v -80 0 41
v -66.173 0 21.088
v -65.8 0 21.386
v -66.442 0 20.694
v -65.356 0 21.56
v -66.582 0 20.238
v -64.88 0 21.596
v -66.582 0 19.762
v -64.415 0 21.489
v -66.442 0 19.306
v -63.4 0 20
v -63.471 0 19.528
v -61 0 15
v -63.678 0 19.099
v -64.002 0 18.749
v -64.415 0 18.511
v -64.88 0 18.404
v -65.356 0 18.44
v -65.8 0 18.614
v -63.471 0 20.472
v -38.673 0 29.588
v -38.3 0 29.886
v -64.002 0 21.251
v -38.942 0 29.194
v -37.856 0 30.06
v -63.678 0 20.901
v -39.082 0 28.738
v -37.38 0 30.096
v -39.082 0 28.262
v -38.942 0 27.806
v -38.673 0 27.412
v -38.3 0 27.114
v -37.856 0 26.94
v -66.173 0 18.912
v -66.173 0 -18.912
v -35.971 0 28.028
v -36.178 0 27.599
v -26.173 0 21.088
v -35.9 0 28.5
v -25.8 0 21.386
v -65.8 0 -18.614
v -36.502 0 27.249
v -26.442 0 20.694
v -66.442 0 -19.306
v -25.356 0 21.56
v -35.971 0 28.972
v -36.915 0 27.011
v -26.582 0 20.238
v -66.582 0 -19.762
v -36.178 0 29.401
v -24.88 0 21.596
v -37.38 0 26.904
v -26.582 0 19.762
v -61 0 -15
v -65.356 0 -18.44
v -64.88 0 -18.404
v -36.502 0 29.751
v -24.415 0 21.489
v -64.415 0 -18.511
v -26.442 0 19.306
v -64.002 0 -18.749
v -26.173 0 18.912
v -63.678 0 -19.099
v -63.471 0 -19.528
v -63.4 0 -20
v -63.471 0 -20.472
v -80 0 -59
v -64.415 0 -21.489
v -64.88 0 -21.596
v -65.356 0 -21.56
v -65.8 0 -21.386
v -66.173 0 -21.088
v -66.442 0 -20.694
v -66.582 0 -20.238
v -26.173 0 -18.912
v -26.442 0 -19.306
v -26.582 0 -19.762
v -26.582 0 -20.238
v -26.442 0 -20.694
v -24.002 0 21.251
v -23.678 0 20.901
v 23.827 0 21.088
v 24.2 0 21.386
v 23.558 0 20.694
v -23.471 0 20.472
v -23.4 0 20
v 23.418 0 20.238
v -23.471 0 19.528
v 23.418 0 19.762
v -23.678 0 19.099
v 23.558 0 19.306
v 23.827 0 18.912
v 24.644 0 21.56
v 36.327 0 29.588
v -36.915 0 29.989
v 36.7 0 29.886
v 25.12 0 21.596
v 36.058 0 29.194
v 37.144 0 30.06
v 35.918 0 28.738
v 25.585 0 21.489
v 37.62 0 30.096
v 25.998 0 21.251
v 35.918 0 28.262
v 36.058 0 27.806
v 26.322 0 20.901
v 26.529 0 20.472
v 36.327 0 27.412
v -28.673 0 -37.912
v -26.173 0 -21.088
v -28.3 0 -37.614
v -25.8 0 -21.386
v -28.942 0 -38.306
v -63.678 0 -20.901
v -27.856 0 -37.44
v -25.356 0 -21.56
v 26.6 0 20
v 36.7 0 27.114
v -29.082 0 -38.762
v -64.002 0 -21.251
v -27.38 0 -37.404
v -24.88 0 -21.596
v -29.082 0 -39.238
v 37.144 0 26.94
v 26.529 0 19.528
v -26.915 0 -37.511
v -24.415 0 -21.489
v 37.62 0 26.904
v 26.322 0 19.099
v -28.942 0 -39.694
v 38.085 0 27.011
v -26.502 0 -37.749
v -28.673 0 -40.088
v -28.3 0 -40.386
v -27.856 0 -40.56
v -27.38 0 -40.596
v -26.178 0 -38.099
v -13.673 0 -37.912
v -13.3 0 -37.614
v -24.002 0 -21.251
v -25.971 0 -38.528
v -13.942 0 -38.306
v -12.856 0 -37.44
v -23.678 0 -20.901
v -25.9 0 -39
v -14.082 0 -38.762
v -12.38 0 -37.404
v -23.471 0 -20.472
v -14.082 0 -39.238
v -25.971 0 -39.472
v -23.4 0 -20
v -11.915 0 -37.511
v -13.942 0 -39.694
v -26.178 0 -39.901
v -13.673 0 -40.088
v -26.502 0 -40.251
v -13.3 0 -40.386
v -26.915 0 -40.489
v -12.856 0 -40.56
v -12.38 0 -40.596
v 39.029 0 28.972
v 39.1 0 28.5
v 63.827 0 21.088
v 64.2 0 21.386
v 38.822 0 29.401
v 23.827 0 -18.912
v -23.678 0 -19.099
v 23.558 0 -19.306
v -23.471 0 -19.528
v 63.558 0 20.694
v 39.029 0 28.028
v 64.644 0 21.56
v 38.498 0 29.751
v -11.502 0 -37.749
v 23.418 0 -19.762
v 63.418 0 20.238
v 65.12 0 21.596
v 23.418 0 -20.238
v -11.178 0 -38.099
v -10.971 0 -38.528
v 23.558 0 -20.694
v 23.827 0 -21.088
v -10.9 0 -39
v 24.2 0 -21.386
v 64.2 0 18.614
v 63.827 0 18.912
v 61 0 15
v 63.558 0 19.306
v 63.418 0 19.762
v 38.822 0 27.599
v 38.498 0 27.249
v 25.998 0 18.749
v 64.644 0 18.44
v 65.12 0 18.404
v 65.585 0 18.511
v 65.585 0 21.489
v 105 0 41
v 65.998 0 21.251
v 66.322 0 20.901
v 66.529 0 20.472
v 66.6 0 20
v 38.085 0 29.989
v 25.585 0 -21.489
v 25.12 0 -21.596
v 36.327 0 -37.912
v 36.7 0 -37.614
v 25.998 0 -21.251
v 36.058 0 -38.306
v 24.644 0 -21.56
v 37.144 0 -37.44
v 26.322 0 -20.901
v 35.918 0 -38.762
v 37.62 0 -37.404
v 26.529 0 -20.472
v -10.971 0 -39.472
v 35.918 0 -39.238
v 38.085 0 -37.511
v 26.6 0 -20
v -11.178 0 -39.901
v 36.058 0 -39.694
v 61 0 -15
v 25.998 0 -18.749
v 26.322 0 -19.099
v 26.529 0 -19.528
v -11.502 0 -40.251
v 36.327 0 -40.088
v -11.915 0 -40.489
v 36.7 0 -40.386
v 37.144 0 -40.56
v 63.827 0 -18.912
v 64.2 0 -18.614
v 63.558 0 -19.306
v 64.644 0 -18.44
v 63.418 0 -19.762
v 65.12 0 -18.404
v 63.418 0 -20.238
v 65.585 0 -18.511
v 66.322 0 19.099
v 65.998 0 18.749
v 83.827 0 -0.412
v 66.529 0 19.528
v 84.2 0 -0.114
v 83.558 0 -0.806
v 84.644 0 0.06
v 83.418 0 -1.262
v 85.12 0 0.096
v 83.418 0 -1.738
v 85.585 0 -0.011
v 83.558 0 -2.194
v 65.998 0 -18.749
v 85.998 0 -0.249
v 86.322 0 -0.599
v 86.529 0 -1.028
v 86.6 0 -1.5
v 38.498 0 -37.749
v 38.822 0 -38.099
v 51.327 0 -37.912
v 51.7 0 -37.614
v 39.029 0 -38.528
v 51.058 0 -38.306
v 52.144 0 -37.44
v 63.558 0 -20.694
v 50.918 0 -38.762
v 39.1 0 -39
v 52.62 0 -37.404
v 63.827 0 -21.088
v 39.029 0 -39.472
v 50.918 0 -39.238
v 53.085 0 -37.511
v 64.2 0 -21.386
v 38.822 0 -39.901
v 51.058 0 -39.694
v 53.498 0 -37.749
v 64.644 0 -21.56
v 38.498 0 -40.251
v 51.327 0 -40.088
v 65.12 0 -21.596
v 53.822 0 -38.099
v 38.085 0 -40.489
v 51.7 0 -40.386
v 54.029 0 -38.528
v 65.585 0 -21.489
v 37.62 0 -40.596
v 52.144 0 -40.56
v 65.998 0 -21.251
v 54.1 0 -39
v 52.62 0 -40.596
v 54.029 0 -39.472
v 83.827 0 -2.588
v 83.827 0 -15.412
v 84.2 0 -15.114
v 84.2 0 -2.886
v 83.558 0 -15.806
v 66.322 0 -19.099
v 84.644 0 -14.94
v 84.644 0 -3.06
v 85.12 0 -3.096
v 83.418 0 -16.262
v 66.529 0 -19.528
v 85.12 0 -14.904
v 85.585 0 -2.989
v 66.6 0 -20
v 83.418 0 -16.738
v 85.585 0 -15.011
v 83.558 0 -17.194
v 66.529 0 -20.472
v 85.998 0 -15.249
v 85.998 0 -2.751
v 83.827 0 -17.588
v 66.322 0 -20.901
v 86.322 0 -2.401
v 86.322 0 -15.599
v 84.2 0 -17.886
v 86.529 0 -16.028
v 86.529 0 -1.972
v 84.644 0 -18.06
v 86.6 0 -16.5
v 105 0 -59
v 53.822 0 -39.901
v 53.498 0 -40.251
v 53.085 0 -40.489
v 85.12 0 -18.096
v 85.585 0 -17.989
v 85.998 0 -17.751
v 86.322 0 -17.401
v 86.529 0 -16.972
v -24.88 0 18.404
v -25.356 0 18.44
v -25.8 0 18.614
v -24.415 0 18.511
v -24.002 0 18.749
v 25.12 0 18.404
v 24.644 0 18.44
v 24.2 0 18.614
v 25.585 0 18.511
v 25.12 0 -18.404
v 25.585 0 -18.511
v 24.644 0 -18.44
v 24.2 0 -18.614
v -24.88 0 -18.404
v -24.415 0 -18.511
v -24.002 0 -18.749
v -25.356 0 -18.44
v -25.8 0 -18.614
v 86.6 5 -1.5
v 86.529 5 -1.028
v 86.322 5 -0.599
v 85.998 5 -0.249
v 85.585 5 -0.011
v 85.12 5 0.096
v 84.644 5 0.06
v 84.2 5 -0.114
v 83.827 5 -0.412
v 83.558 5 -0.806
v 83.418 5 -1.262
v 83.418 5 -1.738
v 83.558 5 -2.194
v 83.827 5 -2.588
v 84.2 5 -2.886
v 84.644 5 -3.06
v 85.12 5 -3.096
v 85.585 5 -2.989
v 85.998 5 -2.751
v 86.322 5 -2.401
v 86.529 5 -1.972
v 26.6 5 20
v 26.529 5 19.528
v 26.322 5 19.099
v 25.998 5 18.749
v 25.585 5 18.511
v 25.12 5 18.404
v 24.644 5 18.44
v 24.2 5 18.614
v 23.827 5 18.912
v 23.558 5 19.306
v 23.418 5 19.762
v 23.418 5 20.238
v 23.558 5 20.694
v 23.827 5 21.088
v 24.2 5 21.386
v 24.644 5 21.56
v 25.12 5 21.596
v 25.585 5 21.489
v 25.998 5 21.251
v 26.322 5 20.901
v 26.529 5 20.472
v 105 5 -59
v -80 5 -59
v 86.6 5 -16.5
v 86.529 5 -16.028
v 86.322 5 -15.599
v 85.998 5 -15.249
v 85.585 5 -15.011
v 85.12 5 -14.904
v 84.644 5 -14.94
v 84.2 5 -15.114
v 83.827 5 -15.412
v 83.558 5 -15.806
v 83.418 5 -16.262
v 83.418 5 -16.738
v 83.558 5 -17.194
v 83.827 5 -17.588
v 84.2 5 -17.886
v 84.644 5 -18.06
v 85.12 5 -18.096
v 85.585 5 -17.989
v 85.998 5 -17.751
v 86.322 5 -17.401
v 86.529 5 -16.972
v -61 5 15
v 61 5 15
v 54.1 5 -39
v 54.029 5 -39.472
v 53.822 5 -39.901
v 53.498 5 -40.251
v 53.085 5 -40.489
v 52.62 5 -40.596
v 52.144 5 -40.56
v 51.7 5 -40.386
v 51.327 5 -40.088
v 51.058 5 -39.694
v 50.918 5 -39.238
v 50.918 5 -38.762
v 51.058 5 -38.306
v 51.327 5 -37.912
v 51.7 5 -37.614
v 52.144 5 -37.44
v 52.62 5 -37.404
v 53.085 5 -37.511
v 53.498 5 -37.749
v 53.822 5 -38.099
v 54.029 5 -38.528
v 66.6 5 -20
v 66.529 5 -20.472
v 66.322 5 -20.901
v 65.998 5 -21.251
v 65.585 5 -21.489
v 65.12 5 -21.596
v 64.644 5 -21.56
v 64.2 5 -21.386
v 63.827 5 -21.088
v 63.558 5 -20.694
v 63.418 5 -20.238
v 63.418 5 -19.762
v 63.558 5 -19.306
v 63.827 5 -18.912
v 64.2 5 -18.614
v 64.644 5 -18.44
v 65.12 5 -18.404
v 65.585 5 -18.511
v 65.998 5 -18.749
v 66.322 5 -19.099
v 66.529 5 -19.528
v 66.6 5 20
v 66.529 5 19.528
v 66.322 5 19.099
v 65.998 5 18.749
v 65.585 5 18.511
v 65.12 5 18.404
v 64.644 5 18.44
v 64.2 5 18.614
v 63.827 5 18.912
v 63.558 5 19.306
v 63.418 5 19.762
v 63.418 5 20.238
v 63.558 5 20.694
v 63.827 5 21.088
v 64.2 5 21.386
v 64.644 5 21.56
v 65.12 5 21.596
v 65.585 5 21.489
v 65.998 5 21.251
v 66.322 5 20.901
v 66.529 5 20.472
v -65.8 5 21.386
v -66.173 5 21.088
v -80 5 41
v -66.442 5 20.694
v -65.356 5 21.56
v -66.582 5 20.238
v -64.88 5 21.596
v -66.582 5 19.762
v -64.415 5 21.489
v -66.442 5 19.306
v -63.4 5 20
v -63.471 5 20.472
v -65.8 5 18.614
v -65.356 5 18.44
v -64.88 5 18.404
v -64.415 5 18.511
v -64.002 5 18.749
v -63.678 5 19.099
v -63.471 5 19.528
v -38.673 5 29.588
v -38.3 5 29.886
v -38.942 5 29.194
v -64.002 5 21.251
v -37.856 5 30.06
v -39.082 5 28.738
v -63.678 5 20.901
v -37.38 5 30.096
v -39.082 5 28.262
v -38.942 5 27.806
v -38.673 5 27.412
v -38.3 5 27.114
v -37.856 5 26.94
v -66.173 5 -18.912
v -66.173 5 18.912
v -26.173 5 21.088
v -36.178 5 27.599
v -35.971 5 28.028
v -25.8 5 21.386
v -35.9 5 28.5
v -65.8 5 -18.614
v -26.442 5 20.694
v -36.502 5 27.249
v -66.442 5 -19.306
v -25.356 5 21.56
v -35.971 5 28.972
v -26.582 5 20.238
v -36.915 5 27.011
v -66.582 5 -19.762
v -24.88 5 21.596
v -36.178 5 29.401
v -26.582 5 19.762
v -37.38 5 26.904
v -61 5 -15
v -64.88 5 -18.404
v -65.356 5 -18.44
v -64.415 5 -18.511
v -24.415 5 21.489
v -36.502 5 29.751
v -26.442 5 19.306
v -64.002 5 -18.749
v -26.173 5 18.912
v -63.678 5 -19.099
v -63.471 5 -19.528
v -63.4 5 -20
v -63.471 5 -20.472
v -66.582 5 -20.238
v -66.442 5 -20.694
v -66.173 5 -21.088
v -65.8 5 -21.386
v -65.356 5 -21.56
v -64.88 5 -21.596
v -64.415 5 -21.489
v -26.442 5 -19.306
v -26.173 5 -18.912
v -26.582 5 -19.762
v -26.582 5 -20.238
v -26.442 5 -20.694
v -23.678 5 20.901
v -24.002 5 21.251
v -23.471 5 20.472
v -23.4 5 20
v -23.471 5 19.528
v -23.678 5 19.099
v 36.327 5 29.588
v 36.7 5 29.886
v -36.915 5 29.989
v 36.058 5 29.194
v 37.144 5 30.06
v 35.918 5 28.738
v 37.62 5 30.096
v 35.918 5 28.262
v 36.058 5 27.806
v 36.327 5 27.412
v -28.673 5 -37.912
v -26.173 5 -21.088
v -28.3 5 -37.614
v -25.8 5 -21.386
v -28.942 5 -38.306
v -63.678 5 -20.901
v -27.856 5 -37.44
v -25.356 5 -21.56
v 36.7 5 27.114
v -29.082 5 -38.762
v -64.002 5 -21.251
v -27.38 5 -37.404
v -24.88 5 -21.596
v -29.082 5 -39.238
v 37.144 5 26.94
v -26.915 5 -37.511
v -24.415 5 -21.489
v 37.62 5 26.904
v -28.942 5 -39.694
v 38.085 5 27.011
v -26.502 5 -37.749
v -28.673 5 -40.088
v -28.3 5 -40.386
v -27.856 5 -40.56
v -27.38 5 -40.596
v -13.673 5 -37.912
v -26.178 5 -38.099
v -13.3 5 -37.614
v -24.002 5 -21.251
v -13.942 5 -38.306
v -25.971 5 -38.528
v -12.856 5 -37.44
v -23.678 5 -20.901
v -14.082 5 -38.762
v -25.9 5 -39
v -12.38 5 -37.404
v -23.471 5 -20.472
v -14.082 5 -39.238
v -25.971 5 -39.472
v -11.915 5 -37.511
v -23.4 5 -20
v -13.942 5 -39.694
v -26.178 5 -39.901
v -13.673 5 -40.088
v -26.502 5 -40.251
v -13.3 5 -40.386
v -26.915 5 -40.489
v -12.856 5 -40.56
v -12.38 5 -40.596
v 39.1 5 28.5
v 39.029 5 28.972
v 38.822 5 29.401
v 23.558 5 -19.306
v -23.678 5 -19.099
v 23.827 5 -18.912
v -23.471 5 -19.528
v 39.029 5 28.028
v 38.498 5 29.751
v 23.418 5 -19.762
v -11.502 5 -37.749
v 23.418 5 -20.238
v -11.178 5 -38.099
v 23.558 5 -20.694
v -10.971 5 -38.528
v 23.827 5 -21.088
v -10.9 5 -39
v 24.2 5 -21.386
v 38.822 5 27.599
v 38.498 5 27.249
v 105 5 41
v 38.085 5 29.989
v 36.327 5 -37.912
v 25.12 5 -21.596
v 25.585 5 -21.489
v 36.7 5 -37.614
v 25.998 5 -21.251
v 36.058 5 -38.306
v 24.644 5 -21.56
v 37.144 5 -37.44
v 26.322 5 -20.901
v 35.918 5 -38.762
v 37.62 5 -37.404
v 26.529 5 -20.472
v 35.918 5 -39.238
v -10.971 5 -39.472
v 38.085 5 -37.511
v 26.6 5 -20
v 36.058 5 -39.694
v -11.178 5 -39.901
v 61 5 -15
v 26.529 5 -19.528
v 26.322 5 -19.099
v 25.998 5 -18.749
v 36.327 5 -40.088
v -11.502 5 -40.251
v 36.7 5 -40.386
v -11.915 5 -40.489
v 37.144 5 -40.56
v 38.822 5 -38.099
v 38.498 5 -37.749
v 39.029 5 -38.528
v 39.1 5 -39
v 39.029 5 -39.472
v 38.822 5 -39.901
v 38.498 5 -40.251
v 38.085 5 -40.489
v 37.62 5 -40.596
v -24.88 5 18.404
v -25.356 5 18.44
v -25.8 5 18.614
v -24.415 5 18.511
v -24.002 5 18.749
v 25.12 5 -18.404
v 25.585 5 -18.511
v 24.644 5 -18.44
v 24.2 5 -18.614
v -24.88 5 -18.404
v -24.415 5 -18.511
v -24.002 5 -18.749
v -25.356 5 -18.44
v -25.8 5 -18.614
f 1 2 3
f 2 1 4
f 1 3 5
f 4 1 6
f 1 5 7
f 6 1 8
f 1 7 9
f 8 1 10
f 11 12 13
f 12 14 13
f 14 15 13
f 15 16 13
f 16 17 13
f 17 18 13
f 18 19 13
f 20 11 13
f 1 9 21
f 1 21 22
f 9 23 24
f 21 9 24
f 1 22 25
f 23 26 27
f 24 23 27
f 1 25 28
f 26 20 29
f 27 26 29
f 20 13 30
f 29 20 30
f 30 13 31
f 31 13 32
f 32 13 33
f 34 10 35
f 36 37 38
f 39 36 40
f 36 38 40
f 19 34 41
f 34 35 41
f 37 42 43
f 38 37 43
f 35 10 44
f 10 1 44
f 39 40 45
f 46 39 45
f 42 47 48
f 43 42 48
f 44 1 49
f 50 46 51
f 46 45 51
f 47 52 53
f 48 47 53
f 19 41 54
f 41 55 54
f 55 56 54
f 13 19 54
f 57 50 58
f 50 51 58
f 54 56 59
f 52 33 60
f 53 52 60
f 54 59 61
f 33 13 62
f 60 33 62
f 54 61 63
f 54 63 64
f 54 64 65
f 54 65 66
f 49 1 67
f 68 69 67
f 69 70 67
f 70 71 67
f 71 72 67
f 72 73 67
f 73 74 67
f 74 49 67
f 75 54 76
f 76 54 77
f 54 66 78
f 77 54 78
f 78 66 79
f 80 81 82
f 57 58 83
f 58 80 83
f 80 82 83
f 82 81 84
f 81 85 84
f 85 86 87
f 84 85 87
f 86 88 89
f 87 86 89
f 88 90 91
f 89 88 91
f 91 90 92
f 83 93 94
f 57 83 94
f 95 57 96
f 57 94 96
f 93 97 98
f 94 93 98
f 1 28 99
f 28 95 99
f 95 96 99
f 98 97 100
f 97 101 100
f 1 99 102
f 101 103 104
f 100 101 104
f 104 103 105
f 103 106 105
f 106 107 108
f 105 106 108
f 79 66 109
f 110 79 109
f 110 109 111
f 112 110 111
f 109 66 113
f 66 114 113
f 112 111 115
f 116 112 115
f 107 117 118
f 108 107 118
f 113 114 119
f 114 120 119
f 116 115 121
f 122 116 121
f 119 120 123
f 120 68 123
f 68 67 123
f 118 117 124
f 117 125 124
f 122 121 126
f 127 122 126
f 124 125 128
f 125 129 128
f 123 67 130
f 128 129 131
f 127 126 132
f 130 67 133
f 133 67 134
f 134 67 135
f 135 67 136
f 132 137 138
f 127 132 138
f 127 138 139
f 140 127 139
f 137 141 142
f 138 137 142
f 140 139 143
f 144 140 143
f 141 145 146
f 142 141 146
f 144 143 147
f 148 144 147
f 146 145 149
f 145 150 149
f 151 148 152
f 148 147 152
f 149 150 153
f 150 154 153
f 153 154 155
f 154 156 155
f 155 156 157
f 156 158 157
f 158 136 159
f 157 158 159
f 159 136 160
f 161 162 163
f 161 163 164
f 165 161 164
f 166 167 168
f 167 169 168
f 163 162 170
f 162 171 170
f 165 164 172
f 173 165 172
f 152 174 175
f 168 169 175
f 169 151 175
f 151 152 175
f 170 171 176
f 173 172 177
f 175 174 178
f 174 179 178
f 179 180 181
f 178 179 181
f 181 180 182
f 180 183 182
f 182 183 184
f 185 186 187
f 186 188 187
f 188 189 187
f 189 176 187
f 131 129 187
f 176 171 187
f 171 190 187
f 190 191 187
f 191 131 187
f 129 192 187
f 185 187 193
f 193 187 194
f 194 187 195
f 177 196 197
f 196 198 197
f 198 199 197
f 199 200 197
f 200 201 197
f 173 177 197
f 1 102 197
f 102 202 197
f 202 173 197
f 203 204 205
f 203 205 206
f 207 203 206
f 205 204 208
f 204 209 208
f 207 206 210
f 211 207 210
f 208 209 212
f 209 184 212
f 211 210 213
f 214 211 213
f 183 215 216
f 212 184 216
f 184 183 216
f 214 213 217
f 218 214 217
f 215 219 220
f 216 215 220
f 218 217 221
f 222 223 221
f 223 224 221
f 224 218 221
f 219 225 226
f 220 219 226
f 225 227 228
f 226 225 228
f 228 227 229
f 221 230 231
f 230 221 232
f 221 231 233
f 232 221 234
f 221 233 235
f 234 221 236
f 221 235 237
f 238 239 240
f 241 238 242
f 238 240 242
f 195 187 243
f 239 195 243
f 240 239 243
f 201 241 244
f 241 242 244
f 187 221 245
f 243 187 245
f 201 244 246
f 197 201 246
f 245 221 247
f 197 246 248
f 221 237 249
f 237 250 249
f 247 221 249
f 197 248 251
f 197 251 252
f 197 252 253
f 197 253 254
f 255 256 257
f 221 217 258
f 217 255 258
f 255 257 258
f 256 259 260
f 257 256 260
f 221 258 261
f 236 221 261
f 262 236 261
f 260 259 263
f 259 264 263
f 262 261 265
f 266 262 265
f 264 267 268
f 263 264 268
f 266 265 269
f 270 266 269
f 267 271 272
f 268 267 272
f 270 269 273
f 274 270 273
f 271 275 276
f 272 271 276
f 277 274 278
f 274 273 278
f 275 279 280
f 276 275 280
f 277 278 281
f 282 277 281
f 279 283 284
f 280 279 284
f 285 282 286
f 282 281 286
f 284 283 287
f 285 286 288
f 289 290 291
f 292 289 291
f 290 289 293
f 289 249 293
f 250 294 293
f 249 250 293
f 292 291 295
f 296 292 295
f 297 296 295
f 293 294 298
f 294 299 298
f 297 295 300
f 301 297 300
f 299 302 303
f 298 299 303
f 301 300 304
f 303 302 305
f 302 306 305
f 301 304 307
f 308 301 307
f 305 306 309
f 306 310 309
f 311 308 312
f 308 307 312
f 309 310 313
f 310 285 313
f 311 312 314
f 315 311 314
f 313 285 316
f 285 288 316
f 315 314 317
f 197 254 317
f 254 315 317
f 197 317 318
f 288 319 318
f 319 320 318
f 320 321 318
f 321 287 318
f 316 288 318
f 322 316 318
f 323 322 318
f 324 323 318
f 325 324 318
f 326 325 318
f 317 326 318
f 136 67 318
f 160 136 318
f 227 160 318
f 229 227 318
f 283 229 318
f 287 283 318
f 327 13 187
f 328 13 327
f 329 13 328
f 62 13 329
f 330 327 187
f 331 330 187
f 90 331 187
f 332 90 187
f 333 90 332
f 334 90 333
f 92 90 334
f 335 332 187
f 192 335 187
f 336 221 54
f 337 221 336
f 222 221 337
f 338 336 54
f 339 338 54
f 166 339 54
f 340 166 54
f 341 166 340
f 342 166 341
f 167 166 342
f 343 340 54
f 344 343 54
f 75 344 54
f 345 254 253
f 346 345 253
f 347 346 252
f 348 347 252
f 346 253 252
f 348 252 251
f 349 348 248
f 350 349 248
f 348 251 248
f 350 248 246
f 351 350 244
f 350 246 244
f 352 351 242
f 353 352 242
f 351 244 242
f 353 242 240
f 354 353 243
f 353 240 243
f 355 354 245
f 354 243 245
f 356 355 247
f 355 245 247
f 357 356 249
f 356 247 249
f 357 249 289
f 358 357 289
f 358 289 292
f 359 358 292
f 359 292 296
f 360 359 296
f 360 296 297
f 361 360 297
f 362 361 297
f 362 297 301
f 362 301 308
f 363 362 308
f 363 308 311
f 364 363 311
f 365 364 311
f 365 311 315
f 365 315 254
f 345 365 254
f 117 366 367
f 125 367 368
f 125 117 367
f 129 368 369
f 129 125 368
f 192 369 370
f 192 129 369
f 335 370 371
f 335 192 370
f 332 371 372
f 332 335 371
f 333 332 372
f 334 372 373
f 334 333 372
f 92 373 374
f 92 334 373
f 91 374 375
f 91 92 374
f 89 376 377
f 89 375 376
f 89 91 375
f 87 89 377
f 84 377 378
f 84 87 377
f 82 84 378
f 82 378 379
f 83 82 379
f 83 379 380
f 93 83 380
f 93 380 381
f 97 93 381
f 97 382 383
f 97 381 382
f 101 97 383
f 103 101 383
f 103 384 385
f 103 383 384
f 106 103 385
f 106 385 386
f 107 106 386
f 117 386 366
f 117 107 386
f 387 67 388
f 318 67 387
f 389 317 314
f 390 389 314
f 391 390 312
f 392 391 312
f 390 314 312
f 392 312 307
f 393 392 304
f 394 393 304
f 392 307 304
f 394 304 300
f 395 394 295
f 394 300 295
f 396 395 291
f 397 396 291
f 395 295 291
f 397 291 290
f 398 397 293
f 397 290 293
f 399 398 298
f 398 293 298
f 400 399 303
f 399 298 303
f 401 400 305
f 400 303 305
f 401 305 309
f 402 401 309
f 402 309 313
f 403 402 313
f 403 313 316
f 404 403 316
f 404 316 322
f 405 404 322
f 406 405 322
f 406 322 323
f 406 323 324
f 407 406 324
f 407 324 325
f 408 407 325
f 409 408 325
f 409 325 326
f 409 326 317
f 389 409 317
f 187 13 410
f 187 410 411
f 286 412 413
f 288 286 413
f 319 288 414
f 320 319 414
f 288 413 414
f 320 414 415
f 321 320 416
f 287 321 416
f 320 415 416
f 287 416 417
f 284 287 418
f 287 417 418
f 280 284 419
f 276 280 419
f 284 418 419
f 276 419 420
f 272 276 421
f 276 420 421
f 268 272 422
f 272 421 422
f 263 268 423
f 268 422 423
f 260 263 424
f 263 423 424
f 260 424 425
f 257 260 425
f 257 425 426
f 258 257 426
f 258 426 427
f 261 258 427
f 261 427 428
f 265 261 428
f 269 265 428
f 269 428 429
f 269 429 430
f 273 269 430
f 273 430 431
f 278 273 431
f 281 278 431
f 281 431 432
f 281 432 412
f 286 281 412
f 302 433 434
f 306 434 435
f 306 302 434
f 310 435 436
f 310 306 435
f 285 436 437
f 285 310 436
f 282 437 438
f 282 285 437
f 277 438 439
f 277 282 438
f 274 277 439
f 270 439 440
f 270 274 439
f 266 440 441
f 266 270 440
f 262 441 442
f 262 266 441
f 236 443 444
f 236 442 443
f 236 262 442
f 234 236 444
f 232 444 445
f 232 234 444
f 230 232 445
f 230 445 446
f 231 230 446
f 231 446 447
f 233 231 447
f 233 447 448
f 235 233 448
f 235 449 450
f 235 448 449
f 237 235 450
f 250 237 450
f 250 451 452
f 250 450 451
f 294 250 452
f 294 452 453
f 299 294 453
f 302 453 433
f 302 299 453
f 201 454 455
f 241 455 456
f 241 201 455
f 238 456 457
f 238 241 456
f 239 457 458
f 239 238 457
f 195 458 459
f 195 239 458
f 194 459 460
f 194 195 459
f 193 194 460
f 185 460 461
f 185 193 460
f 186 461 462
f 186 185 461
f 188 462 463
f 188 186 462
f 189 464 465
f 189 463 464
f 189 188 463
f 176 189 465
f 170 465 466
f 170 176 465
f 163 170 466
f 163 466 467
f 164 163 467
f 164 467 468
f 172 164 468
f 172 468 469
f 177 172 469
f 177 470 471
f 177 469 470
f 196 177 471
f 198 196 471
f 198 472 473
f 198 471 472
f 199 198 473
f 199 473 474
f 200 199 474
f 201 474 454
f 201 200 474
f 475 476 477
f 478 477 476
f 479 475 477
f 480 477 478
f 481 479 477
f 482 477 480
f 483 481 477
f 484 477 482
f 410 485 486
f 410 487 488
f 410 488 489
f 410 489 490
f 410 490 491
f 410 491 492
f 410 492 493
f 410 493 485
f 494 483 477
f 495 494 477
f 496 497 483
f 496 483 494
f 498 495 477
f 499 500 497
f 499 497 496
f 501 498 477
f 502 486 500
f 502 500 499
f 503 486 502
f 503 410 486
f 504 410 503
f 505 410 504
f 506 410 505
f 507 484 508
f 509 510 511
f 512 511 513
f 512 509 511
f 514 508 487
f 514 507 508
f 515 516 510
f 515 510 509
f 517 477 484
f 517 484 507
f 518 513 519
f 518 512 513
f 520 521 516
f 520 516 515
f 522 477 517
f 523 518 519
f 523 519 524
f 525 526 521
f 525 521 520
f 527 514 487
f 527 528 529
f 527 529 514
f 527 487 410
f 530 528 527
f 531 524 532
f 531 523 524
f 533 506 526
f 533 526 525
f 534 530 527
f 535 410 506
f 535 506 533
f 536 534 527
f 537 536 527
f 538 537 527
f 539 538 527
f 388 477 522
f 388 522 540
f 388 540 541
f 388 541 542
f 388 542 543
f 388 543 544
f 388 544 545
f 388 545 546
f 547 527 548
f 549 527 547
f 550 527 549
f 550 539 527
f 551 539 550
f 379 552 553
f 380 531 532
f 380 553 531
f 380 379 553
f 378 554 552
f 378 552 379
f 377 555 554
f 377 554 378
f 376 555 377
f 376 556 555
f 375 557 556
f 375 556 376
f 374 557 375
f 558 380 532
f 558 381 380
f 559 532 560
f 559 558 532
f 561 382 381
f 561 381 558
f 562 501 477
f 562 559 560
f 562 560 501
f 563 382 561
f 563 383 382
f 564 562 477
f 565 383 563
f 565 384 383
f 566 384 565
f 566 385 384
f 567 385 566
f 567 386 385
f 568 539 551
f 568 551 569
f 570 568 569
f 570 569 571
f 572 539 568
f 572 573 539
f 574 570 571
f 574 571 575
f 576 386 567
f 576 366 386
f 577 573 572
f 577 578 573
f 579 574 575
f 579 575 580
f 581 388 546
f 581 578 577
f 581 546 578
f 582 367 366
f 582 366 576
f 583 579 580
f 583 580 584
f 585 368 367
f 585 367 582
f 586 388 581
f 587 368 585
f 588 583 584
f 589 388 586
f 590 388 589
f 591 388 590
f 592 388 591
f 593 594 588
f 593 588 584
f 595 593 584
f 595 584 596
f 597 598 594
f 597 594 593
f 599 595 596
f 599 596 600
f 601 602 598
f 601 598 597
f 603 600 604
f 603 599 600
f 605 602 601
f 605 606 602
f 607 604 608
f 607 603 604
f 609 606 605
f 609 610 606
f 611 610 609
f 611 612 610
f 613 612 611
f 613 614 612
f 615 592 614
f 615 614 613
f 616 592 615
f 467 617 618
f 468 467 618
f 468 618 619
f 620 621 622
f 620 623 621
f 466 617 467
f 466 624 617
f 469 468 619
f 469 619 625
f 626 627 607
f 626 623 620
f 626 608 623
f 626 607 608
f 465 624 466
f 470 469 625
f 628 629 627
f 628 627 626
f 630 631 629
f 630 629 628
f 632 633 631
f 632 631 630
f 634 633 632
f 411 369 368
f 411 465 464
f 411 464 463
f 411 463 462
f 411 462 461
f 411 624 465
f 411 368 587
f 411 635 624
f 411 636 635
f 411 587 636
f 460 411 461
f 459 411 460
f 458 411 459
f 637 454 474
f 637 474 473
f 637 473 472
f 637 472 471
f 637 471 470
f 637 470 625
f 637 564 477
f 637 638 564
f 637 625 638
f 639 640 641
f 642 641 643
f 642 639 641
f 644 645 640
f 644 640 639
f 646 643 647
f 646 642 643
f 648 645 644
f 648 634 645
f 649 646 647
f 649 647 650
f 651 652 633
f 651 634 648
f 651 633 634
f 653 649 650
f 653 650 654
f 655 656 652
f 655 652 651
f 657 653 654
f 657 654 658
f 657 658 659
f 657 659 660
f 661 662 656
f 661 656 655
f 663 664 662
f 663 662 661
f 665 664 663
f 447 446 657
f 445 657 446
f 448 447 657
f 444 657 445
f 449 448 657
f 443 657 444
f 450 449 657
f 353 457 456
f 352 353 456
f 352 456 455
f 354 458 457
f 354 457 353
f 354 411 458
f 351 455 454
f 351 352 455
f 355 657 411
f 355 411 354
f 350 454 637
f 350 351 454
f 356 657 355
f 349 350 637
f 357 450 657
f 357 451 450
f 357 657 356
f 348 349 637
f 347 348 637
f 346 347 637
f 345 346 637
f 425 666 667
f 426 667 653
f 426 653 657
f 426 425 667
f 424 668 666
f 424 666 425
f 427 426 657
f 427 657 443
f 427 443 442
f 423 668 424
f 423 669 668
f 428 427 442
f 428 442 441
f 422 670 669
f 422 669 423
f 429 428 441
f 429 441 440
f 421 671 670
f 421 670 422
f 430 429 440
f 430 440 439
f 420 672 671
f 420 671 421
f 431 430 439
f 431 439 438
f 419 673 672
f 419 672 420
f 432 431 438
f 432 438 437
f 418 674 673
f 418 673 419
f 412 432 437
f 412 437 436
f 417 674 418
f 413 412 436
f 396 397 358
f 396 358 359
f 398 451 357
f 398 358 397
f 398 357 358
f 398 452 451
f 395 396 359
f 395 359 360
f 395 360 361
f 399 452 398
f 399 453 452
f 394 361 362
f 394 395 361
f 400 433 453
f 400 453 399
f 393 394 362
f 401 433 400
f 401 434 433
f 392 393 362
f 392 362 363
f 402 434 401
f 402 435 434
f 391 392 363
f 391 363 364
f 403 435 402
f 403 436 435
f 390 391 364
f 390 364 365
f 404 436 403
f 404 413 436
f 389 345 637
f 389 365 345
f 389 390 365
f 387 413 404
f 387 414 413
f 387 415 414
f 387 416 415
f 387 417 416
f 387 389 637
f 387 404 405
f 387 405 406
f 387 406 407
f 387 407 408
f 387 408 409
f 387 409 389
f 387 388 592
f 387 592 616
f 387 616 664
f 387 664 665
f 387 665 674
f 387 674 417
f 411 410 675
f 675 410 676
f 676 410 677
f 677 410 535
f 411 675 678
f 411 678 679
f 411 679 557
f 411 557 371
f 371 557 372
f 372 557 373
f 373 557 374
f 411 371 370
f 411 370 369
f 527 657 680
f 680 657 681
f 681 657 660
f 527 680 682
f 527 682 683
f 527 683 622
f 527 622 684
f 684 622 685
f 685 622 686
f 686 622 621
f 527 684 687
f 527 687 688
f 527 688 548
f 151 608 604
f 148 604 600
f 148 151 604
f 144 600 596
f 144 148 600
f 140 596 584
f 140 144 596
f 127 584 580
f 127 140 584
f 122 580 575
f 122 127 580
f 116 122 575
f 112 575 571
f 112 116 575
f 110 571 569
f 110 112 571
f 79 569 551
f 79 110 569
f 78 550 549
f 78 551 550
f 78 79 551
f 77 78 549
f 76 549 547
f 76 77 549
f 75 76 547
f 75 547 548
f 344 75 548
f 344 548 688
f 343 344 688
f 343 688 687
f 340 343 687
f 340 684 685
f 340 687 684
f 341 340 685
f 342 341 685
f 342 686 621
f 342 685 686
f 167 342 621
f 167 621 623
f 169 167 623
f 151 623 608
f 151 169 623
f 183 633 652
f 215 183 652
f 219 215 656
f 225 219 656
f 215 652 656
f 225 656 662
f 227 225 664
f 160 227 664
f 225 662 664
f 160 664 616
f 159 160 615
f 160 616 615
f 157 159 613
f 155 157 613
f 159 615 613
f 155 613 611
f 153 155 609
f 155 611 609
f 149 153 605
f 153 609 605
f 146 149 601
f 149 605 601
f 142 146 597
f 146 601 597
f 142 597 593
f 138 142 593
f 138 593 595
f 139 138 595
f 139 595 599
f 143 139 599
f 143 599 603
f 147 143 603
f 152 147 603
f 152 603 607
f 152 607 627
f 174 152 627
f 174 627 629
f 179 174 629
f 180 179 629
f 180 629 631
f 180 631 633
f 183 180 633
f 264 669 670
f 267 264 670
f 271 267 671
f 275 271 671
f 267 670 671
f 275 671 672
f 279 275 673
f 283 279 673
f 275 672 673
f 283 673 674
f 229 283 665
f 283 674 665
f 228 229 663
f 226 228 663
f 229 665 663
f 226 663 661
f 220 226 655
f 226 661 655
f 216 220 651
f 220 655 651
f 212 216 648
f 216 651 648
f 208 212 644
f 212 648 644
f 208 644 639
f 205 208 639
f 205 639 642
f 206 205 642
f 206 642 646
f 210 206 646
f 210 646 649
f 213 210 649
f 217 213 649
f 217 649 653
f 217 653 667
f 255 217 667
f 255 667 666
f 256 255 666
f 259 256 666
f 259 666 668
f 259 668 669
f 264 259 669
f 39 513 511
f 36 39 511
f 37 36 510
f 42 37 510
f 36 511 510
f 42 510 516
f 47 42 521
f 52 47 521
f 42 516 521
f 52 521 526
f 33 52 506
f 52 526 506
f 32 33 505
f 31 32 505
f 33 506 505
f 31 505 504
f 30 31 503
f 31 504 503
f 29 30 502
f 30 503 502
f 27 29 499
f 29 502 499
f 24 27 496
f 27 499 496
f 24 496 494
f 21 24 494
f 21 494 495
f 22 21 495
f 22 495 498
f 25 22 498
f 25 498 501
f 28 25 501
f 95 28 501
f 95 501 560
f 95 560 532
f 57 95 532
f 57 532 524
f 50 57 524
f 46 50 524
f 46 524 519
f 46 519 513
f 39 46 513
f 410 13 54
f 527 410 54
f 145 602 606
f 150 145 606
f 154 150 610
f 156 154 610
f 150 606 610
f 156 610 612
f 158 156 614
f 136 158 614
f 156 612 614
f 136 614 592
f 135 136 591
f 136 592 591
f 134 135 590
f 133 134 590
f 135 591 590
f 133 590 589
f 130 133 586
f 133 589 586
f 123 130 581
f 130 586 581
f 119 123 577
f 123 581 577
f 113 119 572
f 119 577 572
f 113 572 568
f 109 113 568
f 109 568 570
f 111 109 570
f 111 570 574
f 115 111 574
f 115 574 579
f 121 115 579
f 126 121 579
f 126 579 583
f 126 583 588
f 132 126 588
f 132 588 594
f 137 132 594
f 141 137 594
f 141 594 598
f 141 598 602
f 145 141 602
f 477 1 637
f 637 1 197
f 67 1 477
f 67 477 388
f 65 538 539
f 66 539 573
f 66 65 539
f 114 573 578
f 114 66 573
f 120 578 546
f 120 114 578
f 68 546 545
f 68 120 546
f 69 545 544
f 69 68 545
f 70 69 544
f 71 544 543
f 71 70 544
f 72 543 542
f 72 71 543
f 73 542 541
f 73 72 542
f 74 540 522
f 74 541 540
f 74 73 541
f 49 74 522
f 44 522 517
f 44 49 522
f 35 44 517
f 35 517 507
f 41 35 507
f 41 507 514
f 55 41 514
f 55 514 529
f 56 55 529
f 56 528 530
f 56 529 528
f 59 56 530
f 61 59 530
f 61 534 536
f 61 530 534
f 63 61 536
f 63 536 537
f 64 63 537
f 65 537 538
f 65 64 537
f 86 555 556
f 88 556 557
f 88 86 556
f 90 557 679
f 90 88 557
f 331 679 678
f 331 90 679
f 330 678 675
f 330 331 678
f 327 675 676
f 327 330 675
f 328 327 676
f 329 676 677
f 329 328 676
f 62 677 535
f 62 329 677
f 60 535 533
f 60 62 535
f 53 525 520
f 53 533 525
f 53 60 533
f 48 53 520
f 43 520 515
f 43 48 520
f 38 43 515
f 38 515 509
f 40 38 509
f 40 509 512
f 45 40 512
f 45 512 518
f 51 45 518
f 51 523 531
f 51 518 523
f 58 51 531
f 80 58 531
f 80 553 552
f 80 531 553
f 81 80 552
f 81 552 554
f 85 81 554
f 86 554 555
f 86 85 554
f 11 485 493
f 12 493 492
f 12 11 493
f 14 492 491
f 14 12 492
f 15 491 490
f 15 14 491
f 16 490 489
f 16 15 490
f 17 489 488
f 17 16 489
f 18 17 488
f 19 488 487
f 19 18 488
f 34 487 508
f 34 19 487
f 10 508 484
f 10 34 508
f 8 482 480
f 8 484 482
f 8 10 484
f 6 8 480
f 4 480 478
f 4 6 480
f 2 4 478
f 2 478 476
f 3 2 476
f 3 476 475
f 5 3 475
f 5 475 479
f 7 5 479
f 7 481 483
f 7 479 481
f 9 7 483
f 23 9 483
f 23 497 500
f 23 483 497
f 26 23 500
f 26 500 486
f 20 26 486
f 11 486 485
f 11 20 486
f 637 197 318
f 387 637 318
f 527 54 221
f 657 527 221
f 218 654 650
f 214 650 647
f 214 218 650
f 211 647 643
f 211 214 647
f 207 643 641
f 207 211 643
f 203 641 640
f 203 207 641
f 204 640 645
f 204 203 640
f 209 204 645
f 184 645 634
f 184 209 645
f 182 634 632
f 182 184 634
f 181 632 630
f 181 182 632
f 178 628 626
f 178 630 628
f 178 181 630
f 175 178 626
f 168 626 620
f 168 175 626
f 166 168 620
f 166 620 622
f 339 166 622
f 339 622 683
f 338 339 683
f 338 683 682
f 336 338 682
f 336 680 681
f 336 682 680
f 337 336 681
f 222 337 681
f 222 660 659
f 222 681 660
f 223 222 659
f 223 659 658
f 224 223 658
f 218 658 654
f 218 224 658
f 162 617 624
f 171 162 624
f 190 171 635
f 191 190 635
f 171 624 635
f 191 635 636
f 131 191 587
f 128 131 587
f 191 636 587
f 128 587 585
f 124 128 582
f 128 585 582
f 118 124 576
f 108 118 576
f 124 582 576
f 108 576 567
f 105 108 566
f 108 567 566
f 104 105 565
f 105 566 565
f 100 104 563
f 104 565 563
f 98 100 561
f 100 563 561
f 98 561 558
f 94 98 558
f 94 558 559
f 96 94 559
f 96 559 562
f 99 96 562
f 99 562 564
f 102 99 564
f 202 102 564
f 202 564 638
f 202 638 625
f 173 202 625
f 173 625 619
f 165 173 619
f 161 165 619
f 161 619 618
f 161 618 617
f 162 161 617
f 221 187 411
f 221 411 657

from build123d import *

# Parameters (mm, degrees)
SKETCH1_W           = 185
SKETCH1_H           = 100
SKETCH1_W_2         = 122
SKETCH1_H_2         = 30
BOSS_EXTRUDE1_DEPTH = 5
CUT_EXTRUDE2_REACH  = 7
SKETCH2_R           = 1.6
CUT_EXTRUDE3_REACH  = 7
SKETCH3_R           = 1.6
CUT_EXTRUDE4_REACH  = 7
SKETCH4_R           = 1.6
CUT_EXTRUDE5_REACH  = 7
SKETCH5_R           = 1.6


with BuildPart() as part:
    # Sketch1 → Boss-Extrude1 (new body)
    with BuildSketch(Plane(origin=(0, 0, 0), x_dir=(1, 0, 0), z_dir=(0, 1, 0))):
        with Locations((12.5, 9)):
            Rectangle(SKETCH1_W, SKETCH1_H)
        Rectangle(SKETCH1_W_2, SKETCH1_H_2, mode=Mode.SUBTRACT)
    extrude(amount=BOSS_EXTRUDE1_DEPTH)

    # Sketch2 → Cut-Extrude2 (cut, up to next)
    with BuildSketch(Plane(origin=(0, 0, 0), x_dir=(1, 0, 0), z_dir=(0, 1, 0)), mode=Mode.PRIVATE) as cut_extrude2_sk1:
        with Locations((-25, 20)):
            Circle(SKETCH2_R)
    cut_extrude2_tool1 = extrude(cut_extrude2_sk1.sketch, amount=CUT_EXTRUDE2_REACH, mode=Mode.PRIVATE) & part.part
    add(cut_extrude2_tool1.solids().sort_by_distance((-25, 0, -20))[0], mode=Mode.SUBTRACT)
    # Sketch2 → Cut-Extrude2 (cut, up to next)
    with BuildSketch(Plane(origin=(0, 0, 0), x_dir=(1, 0, 0), z_dir=(0, 1, 0)), mode=Mode.PRIVATE) as cut_extrude2_sk2:
        with Locations((25, 20)):
            Circle(SKETCH2_R)
    cut_extrude2_tool2 = extrude(cut_extrude2_sk2.sketch, amount=CUT_EXTRUDE2_REACH, mode=Mode.PRIVATE) & part.part
    add(cut_extrude2_tool2.solids().sort_by_distance((25, 0, -20))[0], mode=Mode.SUBTRACT)
    # Sketch2 → Cut-Extrude2 (cut, up to next)
    with BuildSketch(Plane(origin=(0, 0, 0), x_dir=(1, 0, 0), z_dir=(0, 1, 0)), mode=Mode.PRIVATE) as cut_extrude2_sk3:
        with Locations((25, -20)):
            Circle(SKETCH2_R)
    cut_extrude2_tool3 = extrude(cut_extrude2_sk3.sketch, amount=CUT_EXTRUDE2_REACH, mode=Mode.PRIVATE) & part.part
    add(cut_extrude2_tool3.solids().sort_by_distance((25, 0, 20))[0], mode=Mode.SUBTRACT)
    # Sketch2 → Cut-Extrude2 (cut, up to next)
    with BuildSketch(Plane(origin=(0, 0, 0), x_dir=(1, 0, 0), z_dir=(0, 1, 0)), mode=Mode.PRIVATE) as cut_extrude2_sk4:
        with Locations((-25, -20)):
            Circle(SKETCH2_R)
    cut_extrude2_tool4 = extrude(cut_extrude2_sk4.sketch, amount=CUT_EXTRUDE2_REACH, mode=Mode.PRIVATE) & part.part
    add(cut_extrude2_tool4.solids().sort_by_distance((-25, 0, 20))[0], mode=Mode.SUBTRACT)
    # Sketch2 → Cut-Extrude2 (cut, up to next)
    with BuildSketch(Plane(origin=(0, 0, 0), x_dir=(1, 0, 0), z_dir=(0, 1, 0)), mode=Mode.PRIVATE) as cut_extrude2_sk5:
        with Locations((-65, 20)):
            Circle(SKETCH2_R)
    cut_extrude2_tool5 = extrude(cut_extrude2_sk5.sketch, amount=CUT_EXTRUDE2_REACH, mode=Mode.PRIVATE) & part.part
    add(cut_extrude2_tool5.solids().sort_by_distance((-65, 0, -20))[0], mode=Mode.SUBTRACT)
    # Sketch2 → Cut-Extrude2 (cut, up to next)
    with BuildSketch(Plane(origin=(0, 0, 0), x_dir=(1, 0, 0), z_dir=(0, 1, 0)), mode=Mode.PRIVATE) as cut_extrude2_sk6:
        with Locations((65, 20)):
            Circle(SKETCH2_R)
    cut_extrude2_tool6 = extrude(cut_extrude2_sk6.sketch, amount=CUT_EXTRUDE2_REACH, mode=Mode.PRIVATE) & part.part
    add(cut_extrude2_tool6.solids().sort_by_distance((65, 0, -20))[0], mode=Mode.SUBTRACT)
    # Sketch2 → Cut-Extrude2 (cut, up to next)
    with BuildSketch(Plane(origin=(0, 0, 0), x_dir=(1, 0, 0), z_dir=(0, 1, 0)), mode=Mode.PRIVATE) as cut_extrude2_sk7:
        with Locations((65, -20)):
            Circle(SKETCH2_R)
    cut_extrude2_tool7 = extrude(cut_extrude2_sk7.sketch, amount=CUT_EXTRUDE2_REACH, mode=Mode.PRIVATE) & part.part
    add(cut_extrude2_tool7.solids().sort_by_distance((65, 0, 20))[0], mode=Mode.SUBTRACT)
    # Sketch2 → Cut-Extrude2 (cut, up to next)
    with BuildSketch(Plane(origin=(0, 0, 0), x_dir=(1, 0, 0), z_dir=(0, 1, 0)), mode=Mode.PRIVATE) as cut_extrude2_sk8:
        with Locations((-65, -20)):
            Circle(SKETCH2_R)
    cut_extrude2_tool8 = extrude(cut_extrude2_sk8.sketch, amount=CUT_EXTRUDE2_REACH, mode=Mode.PRIVATE) & part.part
    add(cut_extrude2_tool8.solids().sort_by_distance((-65, 0, 20))[0], mode=Mode.SUBTRACT)

    # Sketch3 → Cut-Extrude3 (cut, up to next)
    with BuildSketch(Plane(origin=(0, 5, 0), x_dir=(1, 0, 0), z_dir=(0, 1, 0)), mode=Mode.PRIVATE) as cut_extrude3_sk1:
        with Locations((-27.5, 39)):
            Circle(SKETCH3_R)
    cut_extrude3_tool1 = extrude(cut_extrude3_sk1.sketch, amount=-CUT_EXTRUDE3_REACH, mode=Mode.PRIVATE) & part.part
    add(cut_extrude3_tool1.solids().sort_by_distance((-27.5, 5, -39))[0], mode=Mode.SUBTRACT)
    # Sketch3 → Cut-Extrude3 (cut, up to next)
    with BuildSketch(Plane(origin=(0, 5, 0), x_dir=(1, 0, 0), z_dir=(0, 1, 0)), mode=Mode.PRIVATE) as cut_extrude3_sk2:
        with Locations((-12.5, 39)):
            Circle(SKETCH3_R)
    cut_extrude3_tool2 = extrude(cut_extrude3_sk2.sketch, amount=-CUT_EXTRUDE3_REACH, mode=Mode.PRIVATE) & part.part
    add(cut_extrude3_tool2.solids().sort_by_distance((-12.5, 5, -39))[0], mode=Mode.SUBTRACT)
    # Sketch3 → Cut-Extrude3 (cut, up to next)
    with BuildSketch(Plane(origin=(0, 5, 0), x_dir=(1, 0, 0), z_dir=(0, 1, 0)), mode=Mode.PRIVATE) as cut_extrude3_sk3:
        with Locations((37.5, 39)):
            Circle(SKETCH3_R)
    cut_extrude3_tool3 = extrude(cut_extrude3_sk3.sketch, amount=-CUT_EXTRUDE3_REACH, mode=Mode.PRIVATE) & part.part
    add(cut_extrude3_tool3.solids().sort_by_distance((37.5, 5, -39))[0], mode=Mode.SUBTRACT)
    # Sketch3 → Cut-Extrude3 (cut, up to next)
    with BuildSketch(Plane(origin=(0, 5, 0), x_dir=(1, 0, 0), z_dir=(0, 1, 0)), mode=Mode.PRIVATE) as cut_extrude3_sk4:
        with Locations((52.5, 39)):
            Circle(SKETCH3_R)
    cut_extrude3_tool4 = extrude(cut_extrude3_sk4.sketch, amount=-CUT_EXTRUDE3_REACH, mode=Mode.PRIVATE) & part.part
    add(cut_extrude3_tool4.solids().sort_by_distance((52.5, 5, -39))[0], mode=Mode.SUBTRACT)

    # Sketch4 → Cut-Extrude4 (cut, up to next)
    with BuildSketch(Plane(origin=(0, 5, 0), x_dir=(1, 0, 0), z_dir=(0, 1, 0)), mode=Mode.PRIVATE) as cut_extrude4_sk1:
        with Locations((-37.5, -28.5)):
            Circle(SKETCH4_R)
    cut_extrude4_tool1 = extrude(cut_extrude4_sk1.sketch, amount=-CUT_EXTRUDE4_REACH, mode=Mode.PRIVATE) & part.part
    add(cut_extrude4_tool1.solids().sort_by_distance((-37.5, 5, 28.5))[0], mode=Mode.SUBTRACT)
    # Sketch4 → Cut-Extrude4 (cut, up to next)
    with BuildSketch(Plane(origin=(0, 5, 0), x_dir=(1, 0, 0), z_dir=(0, 1, 0)), mode=Mode.PRIVATE) as cut_extrude4_sk2:
        with Locations((37.5, -28.5)):
            Circle(SKETCH4_R)
    cut_extrude4_tool2 = extrude(cut_extrude4_sk2.sketch, amount=-CUT_EXTRUDE4_REACH, mode=Mode.PRIVATE) & part.part
    add(cut_extrude4_tool2.solids().sort_by_distance((37.5, 5, 28.5))[0], mode=Mode.SUBTRACT)

    # Sketch5 → Cut-Extrude5 (cut, up to next)
    with BuildSketch(Plane.XZ, mode=Mode.PRIVATE) as cut_extrude5_sk1:
        with Locations((85, -1.5)):
            Circle(SKETCH5_R)
    cut_extrude5_tool1 = extrude(cut_extrude5_sk1.sketch, amount=-CUT_EXTRUDE5_REACH, mode=Mode.PRIVATE) & part.part
    add(cut_extrude5_tool1.solids().sort_by_distance((85, 0, -1.5))[0], mode=Mode.SUBTRACT)
    # Sketch5 → Cut-Extrude5 (cut, up to next)
    with BuildSketch(Plane.XZ, mode=Mode.PRIVATE) as cut_extrude5_sk2:
        with Locations((85, -16.5)):
            Circle(SKETCH5_R)
    cut_extrude5_tool2 = extrude(cut_extrude5_sk2.sketch, amount=-CUT_EXTRUDE5_REACH, mode=Mode.PRIVATE) & part.part
    add(cut_extrude5_tool2.solids().sort_by_distance((85, 0, -16.5))[0], mode=Mode.SUBTRACT)


solid = part.part
